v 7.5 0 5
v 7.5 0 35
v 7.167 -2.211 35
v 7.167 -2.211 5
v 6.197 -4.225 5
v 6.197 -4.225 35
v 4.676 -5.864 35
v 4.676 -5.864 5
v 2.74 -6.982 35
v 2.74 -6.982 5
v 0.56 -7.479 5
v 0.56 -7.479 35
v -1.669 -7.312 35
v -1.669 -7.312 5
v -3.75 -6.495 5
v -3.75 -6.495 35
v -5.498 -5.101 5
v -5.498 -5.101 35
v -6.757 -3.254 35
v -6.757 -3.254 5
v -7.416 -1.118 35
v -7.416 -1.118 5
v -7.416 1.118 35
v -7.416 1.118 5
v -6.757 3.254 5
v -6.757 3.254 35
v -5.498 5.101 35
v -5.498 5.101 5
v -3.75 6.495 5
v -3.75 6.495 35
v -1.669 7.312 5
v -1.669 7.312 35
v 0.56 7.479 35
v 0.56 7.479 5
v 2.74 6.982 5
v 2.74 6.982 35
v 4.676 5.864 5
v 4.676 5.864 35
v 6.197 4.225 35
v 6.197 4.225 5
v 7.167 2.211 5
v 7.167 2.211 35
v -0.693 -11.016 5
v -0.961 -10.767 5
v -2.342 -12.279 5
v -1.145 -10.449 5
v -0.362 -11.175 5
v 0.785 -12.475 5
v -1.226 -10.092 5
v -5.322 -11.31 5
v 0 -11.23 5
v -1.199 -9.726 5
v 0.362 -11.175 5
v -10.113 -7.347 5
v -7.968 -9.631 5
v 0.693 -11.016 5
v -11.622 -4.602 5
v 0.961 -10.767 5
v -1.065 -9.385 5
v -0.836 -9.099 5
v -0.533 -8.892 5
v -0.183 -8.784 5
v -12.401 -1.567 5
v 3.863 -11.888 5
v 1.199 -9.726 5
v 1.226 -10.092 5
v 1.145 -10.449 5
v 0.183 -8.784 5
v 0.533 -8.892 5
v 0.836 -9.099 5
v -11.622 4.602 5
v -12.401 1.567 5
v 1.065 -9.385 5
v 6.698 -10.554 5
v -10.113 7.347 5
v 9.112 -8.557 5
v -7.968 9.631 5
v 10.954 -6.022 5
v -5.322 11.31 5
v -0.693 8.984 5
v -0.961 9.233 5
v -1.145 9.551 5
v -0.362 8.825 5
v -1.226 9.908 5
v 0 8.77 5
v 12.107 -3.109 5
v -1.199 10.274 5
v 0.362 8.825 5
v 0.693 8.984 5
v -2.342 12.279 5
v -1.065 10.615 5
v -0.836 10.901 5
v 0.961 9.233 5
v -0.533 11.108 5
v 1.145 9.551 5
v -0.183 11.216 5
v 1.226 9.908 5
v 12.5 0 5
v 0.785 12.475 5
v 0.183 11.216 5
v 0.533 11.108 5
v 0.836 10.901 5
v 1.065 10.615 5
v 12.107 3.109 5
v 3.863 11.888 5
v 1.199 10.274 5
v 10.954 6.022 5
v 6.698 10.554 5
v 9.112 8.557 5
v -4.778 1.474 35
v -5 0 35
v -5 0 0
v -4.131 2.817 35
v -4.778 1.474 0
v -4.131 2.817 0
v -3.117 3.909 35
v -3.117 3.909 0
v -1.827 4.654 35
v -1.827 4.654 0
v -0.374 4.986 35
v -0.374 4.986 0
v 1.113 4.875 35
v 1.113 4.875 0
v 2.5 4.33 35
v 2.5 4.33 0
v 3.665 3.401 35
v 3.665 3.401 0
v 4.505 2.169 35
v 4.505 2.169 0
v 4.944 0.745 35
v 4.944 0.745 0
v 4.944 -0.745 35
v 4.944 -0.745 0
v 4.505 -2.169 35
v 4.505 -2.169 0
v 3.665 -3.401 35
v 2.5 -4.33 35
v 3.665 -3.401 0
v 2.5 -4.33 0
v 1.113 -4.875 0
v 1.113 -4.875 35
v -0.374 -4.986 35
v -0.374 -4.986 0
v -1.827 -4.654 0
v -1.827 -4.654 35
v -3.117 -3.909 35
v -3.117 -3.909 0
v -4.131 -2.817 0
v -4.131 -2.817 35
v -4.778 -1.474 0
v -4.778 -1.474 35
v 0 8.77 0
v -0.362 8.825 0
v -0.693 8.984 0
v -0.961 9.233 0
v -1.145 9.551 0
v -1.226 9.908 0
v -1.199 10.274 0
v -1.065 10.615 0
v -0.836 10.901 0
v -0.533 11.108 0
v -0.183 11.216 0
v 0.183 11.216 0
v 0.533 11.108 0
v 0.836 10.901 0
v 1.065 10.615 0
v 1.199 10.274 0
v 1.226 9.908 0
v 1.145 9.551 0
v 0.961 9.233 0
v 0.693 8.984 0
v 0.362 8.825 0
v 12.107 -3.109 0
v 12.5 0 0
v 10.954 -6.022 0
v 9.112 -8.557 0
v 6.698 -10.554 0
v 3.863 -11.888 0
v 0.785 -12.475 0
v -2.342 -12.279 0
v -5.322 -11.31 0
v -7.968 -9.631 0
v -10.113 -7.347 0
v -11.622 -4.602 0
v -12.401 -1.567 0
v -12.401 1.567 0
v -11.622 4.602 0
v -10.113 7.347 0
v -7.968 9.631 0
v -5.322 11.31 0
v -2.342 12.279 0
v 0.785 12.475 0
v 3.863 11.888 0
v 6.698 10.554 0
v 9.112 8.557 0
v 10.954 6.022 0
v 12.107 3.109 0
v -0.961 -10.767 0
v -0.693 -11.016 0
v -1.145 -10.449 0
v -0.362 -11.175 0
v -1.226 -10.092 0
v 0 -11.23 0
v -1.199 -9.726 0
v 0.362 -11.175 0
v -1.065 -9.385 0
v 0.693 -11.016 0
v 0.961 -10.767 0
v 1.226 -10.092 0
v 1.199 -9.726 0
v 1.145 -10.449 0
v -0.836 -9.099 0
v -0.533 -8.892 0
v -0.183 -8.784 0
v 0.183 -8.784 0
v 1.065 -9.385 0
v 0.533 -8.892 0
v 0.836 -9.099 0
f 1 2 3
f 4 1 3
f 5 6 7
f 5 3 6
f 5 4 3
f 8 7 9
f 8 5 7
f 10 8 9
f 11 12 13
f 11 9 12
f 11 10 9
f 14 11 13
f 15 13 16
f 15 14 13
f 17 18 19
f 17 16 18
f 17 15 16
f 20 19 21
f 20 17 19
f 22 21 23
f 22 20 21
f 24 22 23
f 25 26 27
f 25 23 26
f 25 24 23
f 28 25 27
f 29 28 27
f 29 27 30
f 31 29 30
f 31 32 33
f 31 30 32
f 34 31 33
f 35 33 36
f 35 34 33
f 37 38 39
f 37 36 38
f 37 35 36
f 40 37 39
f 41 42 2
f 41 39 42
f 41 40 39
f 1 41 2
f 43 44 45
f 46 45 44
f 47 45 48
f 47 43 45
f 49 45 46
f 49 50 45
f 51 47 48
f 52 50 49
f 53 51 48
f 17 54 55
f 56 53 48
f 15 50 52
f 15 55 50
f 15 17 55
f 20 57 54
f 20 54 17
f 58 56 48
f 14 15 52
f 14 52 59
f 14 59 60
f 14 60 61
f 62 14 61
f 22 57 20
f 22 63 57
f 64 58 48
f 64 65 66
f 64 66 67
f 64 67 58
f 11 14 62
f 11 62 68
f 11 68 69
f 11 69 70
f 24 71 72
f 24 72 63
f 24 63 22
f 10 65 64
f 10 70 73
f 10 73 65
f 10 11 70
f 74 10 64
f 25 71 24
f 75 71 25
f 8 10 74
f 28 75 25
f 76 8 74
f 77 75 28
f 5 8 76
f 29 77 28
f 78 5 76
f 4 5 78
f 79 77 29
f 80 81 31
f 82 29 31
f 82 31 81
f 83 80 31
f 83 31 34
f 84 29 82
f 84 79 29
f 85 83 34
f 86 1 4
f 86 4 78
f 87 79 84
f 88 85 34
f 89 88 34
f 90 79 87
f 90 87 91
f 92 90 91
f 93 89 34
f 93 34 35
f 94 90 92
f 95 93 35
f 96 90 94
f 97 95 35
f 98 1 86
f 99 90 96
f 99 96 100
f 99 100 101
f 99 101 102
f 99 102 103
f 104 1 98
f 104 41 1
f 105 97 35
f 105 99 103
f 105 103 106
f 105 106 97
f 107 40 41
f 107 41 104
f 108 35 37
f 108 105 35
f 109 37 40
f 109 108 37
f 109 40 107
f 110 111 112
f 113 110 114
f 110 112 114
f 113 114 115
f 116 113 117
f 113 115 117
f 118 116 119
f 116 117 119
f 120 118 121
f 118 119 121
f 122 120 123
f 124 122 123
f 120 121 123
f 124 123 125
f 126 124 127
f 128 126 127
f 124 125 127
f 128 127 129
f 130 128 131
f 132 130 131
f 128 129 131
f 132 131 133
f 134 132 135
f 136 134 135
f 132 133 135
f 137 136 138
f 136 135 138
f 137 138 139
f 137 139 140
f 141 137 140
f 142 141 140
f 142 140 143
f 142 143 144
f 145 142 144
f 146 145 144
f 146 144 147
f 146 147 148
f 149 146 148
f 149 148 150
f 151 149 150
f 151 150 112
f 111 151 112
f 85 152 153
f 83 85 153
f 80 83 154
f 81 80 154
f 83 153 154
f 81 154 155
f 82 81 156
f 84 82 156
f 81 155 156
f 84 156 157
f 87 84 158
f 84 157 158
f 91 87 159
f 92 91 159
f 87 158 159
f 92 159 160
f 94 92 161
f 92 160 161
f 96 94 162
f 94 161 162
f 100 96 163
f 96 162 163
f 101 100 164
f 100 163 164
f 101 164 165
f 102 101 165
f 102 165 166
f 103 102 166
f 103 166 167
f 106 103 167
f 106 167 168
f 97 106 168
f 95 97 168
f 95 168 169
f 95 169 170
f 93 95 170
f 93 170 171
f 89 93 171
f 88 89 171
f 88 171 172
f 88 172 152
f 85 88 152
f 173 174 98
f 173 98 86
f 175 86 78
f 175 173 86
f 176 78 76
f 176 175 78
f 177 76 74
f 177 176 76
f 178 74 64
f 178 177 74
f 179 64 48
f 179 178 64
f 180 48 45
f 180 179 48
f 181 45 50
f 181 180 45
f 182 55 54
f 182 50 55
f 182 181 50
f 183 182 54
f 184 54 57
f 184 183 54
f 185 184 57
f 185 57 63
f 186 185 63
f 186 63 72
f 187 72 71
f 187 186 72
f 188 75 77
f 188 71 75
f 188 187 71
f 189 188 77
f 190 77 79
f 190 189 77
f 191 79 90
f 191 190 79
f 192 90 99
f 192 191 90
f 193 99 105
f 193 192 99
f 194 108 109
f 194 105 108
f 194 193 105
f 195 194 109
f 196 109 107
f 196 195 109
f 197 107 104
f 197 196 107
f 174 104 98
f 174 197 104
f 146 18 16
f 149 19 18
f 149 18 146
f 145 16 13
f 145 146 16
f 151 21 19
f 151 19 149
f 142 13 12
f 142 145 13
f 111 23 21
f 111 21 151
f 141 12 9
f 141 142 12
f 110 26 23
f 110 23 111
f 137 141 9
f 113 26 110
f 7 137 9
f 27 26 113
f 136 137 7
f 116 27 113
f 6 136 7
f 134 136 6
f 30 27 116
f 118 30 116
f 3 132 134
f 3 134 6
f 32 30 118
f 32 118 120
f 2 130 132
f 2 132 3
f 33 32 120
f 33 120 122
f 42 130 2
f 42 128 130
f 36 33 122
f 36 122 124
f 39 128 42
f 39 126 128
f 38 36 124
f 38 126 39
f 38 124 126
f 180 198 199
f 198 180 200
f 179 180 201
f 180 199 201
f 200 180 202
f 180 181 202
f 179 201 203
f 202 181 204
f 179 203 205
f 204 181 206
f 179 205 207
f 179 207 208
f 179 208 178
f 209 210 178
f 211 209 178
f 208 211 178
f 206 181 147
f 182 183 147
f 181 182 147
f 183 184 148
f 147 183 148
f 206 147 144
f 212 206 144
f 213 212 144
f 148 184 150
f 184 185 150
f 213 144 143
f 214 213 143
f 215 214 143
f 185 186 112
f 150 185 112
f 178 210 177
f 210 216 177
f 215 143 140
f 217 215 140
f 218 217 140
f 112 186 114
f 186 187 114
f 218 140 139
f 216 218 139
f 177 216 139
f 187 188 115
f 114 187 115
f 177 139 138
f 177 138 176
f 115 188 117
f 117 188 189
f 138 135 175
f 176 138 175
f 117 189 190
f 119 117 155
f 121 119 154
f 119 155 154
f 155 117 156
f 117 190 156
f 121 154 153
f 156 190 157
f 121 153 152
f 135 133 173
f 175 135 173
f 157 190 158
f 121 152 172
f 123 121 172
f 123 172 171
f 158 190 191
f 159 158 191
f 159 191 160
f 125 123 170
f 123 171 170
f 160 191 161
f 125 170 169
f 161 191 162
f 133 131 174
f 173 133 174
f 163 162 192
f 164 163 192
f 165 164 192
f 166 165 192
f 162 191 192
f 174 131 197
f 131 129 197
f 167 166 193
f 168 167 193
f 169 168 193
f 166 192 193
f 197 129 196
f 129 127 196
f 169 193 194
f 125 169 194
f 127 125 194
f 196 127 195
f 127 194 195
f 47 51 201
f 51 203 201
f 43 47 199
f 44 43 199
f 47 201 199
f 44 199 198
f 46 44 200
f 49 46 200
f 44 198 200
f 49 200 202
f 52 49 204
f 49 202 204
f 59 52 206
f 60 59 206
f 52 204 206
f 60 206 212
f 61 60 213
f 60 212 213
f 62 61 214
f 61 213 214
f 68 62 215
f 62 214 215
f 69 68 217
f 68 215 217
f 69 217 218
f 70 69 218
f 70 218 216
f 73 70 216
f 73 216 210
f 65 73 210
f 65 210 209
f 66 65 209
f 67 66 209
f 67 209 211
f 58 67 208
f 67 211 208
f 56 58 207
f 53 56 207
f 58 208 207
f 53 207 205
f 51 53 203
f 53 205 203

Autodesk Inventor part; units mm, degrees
ref_plane "YZ Plane" through (0, 0, 0) normal (1, 0, 0) x (0, 1, 0)
ref_plane "XZ Plane" through (0, 0, 0) normal (0, 1, 0) x (-1, 0, 0)
ref_plane "XY Plane" through (0, 0, 0) normal (0, 0, 1) x (1, 0, 0)
sketch "スケッチ1" plane through (0, 0, 0) normal (0, 0, 1) x (1, 0, 0)
  circle A0 centre (0, 0) radius 12.5
  dimension "d0" = 25
extrude "押し出し1" add sketch "スケッチ1" along normal blind 5
sketch "スケッチ2" plane through (0, 0, 5) normal (0, 0, 1) x (1, 0, 0)
  circle A0 centre (0, 0) radius 7.5
  dimension "d3" = 15
extrude "押し出し2" add sketch "スケッチ2" along normal blind 30
sketch "スケッチ3" plane through (0, 0, 0) normal (0, 0, -1) x (-1, 0, 0)
  circle A0 centre (0, 0) radius 5
  dimension "d6" = 10
extrude "押し出し3" cut sketch "スケッチ3" against normal blind 35
sketch "スケッチ4" plane through (0, 0, 5) normal (0, 0, 1) x (1, 0, 0)
  line L0 (0, 0) -> (-12.5, 0) construction
  circle A0 centre (0, 0) radius 12.5 projected
  point P0 (0, -10)
  point P1 (0, 10)
  dimension "d9" = 20
hole "穴1" at (0, -10, 5) at (0, 10, 5) direction (0, 0, -1) diameter 2.459 end through all thread size "M3x0.5" class "6H" standard "ISO Metric profile"
properties part number "RD005_ペンホルダ"
